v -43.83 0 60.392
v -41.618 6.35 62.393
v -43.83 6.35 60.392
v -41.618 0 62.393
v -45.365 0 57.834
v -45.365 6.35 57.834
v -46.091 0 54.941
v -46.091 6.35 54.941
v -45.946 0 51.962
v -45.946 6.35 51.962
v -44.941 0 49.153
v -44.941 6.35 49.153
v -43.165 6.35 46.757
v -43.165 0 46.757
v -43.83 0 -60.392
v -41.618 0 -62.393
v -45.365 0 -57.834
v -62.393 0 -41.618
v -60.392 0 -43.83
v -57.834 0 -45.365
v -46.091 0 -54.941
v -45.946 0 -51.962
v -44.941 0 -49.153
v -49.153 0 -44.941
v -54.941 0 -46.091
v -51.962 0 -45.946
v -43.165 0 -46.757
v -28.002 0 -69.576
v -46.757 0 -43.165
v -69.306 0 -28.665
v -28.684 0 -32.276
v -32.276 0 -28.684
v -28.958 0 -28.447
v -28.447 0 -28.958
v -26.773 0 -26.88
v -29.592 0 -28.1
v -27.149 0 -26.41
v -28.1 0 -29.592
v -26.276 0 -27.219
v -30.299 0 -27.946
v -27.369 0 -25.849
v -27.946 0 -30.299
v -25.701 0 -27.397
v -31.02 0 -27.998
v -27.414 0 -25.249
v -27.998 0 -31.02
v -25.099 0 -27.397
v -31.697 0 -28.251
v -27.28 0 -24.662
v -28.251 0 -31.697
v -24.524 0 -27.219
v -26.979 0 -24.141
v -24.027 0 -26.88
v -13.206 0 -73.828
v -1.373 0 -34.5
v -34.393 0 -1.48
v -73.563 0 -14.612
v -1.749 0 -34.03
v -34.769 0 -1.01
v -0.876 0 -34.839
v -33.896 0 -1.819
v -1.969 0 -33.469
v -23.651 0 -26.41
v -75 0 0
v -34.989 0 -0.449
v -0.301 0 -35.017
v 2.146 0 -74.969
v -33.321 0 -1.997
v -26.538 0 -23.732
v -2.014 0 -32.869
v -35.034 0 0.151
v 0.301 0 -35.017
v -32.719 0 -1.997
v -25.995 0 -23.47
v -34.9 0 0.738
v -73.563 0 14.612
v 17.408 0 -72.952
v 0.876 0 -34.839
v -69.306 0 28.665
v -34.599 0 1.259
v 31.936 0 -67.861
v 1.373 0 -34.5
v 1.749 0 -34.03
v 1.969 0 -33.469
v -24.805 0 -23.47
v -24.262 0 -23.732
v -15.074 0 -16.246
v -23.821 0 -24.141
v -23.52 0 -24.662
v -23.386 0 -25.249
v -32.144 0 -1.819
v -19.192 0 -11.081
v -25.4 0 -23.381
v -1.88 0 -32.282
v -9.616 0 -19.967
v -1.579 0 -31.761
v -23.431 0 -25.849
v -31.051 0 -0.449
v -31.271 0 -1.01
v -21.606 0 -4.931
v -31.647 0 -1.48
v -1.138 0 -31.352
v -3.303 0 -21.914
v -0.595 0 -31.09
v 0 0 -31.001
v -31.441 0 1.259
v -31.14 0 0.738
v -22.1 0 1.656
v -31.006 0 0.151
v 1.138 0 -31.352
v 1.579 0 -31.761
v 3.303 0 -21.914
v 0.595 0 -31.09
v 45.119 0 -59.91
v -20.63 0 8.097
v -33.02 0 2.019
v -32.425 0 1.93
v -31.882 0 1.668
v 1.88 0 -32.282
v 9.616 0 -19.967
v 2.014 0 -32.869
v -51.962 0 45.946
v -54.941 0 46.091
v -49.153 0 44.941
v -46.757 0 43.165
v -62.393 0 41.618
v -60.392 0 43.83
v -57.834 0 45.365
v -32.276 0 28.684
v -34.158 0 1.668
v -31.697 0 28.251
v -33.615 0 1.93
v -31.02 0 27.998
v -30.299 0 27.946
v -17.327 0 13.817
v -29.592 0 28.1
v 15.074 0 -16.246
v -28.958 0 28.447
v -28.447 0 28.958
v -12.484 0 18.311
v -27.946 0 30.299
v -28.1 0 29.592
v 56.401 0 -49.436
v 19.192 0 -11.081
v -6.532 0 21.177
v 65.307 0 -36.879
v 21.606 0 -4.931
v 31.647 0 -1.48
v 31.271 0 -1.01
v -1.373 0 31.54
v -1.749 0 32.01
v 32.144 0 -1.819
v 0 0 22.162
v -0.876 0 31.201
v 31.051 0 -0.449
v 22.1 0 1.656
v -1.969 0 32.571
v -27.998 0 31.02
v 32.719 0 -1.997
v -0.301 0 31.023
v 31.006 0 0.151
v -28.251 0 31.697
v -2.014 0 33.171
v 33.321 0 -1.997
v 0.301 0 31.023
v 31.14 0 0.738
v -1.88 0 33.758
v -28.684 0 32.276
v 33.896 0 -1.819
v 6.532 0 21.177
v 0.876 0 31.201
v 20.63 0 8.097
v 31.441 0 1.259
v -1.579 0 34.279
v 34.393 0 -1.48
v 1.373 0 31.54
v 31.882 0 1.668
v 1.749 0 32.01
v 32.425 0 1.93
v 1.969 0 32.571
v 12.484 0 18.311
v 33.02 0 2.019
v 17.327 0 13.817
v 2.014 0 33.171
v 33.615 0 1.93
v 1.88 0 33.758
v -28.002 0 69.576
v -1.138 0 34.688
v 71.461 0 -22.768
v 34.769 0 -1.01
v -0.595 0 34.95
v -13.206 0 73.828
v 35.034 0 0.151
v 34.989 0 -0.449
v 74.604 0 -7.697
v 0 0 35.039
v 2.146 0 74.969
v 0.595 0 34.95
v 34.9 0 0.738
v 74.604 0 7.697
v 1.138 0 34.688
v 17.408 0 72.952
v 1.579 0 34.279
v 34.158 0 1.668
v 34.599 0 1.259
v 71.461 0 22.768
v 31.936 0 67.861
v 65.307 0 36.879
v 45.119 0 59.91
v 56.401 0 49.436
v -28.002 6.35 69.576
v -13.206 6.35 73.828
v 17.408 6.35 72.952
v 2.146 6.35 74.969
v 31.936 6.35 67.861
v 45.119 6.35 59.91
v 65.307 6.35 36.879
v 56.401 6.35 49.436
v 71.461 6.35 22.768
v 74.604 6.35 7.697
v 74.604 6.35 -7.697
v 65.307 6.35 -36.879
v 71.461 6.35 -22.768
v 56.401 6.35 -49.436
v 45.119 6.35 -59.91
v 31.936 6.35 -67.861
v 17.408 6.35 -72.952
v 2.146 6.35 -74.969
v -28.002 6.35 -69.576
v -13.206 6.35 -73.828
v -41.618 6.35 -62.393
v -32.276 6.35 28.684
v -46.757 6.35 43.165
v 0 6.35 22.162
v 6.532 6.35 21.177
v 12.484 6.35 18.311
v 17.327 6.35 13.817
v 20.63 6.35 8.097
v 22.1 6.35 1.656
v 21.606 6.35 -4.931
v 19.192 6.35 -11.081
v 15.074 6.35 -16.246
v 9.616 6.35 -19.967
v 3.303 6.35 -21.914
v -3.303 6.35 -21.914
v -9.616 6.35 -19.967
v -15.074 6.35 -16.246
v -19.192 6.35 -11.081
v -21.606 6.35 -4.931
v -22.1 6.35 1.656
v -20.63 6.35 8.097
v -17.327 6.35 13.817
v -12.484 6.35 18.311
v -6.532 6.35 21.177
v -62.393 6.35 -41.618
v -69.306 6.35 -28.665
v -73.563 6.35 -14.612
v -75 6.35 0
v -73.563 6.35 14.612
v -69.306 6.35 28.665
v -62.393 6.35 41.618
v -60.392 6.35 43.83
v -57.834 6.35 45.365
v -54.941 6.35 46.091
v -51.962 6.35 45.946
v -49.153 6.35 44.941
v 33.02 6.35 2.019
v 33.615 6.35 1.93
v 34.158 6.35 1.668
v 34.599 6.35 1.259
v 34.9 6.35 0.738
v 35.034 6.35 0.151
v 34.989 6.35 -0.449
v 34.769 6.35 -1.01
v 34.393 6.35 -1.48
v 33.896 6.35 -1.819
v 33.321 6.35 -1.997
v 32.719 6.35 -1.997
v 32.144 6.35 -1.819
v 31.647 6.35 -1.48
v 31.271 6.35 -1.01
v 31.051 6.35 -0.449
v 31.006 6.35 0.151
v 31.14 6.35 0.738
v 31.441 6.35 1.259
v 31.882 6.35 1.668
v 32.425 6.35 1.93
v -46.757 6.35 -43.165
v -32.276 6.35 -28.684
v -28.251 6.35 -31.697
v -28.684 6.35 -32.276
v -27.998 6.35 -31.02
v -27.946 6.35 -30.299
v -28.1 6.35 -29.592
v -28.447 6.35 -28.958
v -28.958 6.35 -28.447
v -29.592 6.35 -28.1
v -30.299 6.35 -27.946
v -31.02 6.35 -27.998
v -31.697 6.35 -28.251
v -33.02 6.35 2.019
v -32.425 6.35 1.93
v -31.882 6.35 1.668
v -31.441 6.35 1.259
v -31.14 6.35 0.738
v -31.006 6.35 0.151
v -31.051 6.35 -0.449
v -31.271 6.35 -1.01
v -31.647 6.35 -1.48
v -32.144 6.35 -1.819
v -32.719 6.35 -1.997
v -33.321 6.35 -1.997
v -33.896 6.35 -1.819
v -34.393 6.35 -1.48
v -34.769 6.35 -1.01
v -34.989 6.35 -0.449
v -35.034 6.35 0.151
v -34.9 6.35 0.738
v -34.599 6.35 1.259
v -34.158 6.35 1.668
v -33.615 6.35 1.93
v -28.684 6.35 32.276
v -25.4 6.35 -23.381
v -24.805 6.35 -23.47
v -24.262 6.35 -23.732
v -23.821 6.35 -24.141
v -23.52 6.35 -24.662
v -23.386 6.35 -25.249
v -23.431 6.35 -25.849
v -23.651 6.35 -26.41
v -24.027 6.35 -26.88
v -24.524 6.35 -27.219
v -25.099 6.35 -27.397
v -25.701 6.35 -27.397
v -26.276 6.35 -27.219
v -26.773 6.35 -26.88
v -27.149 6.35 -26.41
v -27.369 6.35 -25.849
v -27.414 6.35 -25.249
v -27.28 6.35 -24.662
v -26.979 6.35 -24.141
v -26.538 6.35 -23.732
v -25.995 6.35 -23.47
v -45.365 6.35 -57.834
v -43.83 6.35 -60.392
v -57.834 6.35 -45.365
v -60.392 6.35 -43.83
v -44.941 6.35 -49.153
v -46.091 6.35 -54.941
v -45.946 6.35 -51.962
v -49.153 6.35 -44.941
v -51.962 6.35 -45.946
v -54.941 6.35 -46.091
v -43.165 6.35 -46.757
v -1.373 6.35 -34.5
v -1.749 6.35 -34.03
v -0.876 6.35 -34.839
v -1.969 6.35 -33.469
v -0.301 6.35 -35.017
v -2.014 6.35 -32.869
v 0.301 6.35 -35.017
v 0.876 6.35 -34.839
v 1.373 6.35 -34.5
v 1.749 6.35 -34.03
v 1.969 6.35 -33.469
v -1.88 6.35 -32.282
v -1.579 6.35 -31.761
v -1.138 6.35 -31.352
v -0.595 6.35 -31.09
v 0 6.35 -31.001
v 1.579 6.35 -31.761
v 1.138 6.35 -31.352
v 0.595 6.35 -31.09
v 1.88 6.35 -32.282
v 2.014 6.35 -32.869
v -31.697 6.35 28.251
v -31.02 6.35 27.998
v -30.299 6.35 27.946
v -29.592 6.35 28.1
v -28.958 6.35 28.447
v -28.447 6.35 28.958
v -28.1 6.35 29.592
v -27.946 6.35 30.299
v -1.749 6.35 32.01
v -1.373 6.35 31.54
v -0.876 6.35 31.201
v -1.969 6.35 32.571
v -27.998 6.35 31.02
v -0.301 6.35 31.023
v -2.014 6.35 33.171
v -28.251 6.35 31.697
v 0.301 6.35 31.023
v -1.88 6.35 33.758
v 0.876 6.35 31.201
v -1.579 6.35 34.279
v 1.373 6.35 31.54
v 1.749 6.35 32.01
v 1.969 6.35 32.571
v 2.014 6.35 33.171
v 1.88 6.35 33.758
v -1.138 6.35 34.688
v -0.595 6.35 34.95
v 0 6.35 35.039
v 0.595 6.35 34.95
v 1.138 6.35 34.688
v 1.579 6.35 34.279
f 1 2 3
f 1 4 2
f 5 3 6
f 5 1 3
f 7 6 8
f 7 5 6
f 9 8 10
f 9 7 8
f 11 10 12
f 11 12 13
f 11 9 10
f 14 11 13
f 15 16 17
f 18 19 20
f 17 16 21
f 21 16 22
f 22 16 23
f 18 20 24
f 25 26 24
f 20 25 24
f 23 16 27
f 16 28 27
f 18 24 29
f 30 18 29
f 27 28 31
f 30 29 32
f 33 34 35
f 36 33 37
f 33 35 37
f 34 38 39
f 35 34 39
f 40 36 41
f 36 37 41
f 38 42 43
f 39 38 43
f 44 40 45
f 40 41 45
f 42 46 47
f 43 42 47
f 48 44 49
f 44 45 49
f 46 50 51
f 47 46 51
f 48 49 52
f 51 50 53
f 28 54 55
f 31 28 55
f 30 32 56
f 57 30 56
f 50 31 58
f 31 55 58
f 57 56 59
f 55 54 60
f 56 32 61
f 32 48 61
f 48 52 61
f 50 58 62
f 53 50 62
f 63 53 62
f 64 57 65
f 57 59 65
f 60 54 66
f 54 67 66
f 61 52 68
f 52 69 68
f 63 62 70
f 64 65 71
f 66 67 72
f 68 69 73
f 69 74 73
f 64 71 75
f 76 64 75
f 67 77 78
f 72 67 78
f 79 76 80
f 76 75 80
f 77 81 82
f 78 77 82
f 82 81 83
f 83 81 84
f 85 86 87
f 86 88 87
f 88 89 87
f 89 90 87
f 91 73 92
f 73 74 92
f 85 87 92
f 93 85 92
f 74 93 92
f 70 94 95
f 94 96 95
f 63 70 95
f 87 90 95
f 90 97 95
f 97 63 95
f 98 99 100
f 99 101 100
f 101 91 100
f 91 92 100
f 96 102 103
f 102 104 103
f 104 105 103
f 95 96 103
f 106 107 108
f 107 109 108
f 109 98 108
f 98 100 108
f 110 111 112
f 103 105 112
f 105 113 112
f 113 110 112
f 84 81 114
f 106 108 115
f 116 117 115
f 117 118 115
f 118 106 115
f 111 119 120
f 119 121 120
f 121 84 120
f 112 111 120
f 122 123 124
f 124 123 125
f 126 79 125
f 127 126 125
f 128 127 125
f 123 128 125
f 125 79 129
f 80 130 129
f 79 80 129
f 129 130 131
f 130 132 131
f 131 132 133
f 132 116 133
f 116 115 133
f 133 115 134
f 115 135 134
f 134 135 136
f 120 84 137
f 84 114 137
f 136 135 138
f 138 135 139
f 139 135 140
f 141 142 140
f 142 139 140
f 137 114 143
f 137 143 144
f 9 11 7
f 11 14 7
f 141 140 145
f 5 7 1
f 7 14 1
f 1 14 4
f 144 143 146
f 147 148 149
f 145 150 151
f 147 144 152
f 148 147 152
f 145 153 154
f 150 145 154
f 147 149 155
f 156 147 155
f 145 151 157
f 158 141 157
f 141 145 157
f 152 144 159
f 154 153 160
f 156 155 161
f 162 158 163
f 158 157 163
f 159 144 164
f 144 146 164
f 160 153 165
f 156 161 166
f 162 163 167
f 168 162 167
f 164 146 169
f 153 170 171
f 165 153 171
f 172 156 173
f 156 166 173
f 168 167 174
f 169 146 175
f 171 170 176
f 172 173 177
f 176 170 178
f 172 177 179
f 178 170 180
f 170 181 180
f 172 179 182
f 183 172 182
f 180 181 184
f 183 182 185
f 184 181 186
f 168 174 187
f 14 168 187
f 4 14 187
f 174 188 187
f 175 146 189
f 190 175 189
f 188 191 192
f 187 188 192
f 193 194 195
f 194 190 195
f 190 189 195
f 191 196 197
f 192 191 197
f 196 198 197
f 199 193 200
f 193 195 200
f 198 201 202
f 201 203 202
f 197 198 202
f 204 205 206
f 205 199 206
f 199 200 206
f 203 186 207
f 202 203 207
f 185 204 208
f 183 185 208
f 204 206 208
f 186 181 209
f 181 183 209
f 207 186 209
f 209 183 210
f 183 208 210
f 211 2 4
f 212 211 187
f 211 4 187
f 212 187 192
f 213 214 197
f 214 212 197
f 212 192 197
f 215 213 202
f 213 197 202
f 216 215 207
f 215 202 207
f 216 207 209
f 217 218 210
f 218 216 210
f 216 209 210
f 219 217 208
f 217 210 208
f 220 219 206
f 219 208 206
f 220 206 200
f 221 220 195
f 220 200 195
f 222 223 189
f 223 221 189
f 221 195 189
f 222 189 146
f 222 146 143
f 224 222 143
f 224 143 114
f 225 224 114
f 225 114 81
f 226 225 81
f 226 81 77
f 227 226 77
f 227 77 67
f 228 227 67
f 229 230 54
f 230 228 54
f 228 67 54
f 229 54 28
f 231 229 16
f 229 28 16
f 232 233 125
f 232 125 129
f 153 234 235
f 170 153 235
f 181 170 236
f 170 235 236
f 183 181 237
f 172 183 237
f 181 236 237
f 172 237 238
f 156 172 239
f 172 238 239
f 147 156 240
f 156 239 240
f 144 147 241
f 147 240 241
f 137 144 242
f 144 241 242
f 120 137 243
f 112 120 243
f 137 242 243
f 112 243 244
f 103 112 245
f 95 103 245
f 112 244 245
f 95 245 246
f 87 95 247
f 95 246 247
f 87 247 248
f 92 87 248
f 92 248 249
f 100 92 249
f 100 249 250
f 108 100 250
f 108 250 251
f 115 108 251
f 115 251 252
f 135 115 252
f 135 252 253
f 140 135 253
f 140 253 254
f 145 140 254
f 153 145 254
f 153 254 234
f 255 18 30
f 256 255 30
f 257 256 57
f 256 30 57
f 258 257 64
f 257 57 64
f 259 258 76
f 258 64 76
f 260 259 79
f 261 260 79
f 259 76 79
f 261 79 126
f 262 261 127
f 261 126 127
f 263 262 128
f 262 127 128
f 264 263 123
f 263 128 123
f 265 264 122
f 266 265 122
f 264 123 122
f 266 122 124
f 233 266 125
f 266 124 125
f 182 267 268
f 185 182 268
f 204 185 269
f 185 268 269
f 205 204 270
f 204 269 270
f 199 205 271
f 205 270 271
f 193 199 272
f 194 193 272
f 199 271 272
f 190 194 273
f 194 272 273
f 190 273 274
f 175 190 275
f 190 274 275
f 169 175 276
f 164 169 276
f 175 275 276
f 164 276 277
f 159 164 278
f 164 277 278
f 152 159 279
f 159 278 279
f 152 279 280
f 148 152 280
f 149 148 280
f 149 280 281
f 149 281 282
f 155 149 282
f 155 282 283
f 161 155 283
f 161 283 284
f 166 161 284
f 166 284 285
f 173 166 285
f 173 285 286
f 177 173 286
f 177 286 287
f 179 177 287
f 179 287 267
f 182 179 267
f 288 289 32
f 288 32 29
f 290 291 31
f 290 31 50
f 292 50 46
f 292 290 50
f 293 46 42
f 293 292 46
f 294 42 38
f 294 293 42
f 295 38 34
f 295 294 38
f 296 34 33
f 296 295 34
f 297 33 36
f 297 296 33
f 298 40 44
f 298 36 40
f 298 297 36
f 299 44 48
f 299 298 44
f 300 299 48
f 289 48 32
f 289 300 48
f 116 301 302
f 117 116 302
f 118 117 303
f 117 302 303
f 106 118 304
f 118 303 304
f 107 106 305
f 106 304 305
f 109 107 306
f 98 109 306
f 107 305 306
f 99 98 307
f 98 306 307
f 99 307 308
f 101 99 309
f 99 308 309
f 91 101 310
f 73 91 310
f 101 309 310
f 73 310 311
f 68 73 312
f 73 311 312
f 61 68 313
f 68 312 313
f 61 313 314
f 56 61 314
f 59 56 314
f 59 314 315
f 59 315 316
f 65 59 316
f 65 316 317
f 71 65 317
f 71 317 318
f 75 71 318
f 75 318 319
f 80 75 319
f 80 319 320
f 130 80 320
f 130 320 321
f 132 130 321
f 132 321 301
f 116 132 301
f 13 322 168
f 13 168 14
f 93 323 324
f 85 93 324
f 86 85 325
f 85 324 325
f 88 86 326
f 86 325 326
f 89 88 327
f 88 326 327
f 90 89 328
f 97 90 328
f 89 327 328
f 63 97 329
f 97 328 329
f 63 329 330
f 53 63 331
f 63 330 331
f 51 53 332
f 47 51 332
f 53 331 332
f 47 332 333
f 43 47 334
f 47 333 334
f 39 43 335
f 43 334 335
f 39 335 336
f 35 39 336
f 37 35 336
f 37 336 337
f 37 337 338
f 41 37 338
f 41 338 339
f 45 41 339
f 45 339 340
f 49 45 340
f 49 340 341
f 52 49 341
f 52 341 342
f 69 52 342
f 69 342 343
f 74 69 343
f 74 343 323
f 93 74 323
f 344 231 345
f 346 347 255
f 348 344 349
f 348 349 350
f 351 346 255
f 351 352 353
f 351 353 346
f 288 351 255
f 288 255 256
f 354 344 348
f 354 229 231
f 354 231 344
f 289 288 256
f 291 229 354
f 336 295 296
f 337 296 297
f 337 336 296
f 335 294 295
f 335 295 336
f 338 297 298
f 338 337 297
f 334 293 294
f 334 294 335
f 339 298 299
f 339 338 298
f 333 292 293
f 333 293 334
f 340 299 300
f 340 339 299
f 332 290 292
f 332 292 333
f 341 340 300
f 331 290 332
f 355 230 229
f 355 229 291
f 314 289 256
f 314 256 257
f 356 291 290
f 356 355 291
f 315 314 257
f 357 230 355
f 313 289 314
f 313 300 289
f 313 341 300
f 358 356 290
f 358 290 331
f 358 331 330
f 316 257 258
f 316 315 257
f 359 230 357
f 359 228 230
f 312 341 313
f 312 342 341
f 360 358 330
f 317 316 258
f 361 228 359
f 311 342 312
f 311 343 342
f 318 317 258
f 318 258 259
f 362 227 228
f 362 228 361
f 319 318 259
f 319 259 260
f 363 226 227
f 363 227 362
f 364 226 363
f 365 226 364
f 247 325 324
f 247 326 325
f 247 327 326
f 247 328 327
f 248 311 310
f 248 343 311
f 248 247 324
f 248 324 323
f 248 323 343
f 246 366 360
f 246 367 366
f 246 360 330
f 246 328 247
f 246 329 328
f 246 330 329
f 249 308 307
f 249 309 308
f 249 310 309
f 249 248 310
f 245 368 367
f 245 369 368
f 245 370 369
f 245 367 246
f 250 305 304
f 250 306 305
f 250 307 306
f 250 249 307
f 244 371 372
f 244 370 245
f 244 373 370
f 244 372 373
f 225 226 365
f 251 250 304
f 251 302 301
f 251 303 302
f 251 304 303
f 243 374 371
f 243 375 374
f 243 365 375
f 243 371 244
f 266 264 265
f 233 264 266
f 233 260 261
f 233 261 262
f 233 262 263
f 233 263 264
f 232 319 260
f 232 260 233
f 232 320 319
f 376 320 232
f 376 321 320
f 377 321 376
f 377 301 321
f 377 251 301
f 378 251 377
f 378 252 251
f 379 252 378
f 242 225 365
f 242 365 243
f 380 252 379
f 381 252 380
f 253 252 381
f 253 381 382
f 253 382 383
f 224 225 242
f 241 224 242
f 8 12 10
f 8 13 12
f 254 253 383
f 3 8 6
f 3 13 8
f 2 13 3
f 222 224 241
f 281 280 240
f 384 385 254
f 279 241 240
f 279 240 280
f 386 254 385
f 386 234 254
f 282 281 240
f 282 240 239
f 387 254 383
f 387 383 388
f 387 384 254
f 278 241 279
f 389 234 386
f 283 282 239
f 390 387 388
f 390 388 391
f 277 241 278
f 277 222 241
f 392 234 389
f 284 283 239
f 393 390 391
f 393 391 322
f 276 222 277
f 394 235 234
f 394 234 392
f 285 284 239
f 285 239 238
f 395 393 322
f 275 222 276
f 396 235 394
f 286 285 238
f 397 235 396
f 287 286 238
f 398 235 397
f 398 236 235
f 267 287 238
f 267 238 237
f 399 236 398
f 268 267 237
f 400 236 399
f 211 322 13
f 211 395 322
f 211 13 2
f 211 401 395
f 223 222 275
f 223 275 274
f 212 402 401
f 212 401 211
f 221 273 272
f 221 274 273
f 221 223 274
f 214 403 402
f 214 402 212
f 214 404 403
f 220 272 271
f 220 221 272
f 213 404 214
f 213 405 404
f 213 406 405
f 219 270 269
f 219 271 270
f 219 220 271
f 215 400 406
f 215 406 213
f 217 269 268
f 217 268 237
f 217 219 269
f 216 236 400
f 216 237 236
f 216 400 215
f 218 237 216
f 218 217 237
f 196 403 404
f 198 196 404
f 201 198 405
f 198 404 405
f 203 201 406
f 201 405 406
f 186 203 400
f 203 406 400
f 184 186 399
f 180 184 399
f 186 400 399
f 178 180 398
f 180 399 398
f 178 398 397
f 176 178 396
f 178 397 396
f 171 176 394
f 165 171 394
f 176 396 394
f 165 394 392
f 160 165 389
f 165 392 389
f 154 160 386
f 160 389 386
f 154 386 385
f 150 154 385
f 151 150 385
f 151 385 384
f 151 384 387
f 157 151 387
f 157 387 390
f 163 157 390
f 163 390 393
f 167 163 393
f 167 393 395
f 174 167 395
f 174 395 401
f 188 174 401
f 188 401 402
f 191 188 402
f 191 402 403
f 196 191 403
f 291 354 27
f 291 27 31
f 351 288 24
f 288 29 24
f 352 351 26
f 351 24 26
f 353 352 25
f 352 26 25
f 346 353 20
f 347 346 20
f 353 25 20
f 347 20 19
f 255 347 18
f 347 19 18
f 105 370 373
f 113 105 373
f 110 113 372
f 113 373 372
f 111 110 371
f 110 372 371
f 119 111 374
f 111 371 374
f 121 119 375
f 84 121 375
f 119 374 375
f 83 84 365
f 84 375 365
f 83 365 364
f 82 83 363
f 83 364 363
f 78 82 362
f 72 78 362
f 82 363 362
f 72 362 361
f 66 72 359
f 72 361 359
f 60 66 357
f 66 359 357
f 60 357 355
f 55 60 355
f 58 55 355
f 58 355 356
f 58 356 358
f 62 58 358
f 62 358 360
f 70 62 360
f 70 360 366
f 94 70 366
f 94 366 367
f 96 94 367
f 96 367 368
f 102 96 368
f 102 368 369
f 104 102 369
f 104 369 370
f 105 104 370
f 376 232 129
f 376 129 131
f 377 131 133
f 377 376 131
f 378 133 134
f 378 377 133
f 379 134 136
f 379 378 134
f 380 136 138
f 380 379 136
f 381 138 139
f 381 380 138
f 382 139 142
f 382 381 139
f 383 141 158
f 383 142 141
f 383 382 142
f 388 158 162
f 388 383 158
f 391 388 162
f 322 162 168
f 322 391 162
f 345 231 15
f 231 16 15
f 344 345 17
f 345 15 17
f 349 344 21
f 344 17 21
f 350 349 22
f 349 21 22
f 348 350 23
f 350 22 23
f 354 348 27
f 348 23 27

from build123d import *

# Parameters (mm, degrees)
SKETCH1_R           = 75
BOSS_EXTRUDE1_DEPTH = 6.35
SKETCH45_R          = 22.1615
SKETCH45_R_2        = 2.0193
CUT_EXTRUDE36_DEPTH = 107.255929246
FILLET2_R           = 10.16


with BuildPart() as part:
    # Sketch1 → Boss-Extrude1 (new body)
    with BuildSketch(Plane(origin=(0, 0, 0), x_dir=(1, 0, 0), z_dir=(0, 1, 0))):
        with Locations(Location((0, 0, 0), (0, 0, 270))):
            Circle(SKETCH1_R)
    extrude(amount=BOSS_EXTRUDE1_DEPTH)

    # Sketch45 → Cut-Extrude36 (cut, through all)
    with BuildSketch(Plane(origin=(0, 6.35, 0), x_dir=(1, 0, 0), z_dir=(0, 1, 0))):
        with Locations(Location((0, 0, 0), (0, 0, 270))):
            Circle(SKETCH45_R)
        with Locations(Location((0, 33.02, 0), (0, 0, 270))):
            Circle(SKETCH45_R_2)
        with Locations(Location((-33.02, 0, 0), (0, 0, 270))):
            Circle(SKETCH45_R_2)
        with Locations(Location((0, -33.02, 0), (0, 0, 270))):
            Circle(SKETCH45_R_2)
        with Locations(Location((33.02, 0, 0), (0, 0, 270))):
            Circle(SKETCH45_R_2)
        with Locations(Location((-25.4, 25.4, 0), (0, 0, 270))):
            Circle(SKETCH45_R_2)
        with BuildLine():
            Line((-32.276051224, 28.683948776), (-54.798637954, 51.206535505))
            ThreePointArc((-54.798637954, 51.206535505), (-54.798637954, 54.798637954), (-51.206535505, 54.798637954))
            Line((-51.206535505, 54.798637954), (-28.683948776, 32.276051224))
            ThreePointArc((-28.683948776, 32.276051224), (-28.683948776, 28.683948776), (-32.276051224, 28.683948776))
        make_face()
        with BuildLine():
            Line((-28.683948776, -32.276051224), (-51.206535505, -54.798637954))
            ThreePointArc((-51.206535505, -54.798637954), (-54.798637954, -54.798637954), (-54.798637954, -51.206535505))
            Line((-54.798637954, -51.206535505), (-32.276051224, -28.683948776))
            ThreePointArc((-32.276051224, -28.683948776), (-28.683948776, -28.683948776), (-28.683948776, -32.276051224))
        make_face()
    extrude(amount=-CUT_EXTRUDE36_DEPTH, mode=Mode.SUBTRACT)

    # Fillet2
    fillet2_edges = [part.edges().sort_by_distance(p)[0] for p in [
        (-51.206535505, 3.175, 54.798637954),
        (-54.798637954, 3.175, 51.206535505),
        (-54.798637954, 3.175, -51.206535505),
        (-51.206535505, 3.175, -54.798637954),
    ]]
    fillet(fillet2_edges, radius=FILLET2_R)


solid = part.part
